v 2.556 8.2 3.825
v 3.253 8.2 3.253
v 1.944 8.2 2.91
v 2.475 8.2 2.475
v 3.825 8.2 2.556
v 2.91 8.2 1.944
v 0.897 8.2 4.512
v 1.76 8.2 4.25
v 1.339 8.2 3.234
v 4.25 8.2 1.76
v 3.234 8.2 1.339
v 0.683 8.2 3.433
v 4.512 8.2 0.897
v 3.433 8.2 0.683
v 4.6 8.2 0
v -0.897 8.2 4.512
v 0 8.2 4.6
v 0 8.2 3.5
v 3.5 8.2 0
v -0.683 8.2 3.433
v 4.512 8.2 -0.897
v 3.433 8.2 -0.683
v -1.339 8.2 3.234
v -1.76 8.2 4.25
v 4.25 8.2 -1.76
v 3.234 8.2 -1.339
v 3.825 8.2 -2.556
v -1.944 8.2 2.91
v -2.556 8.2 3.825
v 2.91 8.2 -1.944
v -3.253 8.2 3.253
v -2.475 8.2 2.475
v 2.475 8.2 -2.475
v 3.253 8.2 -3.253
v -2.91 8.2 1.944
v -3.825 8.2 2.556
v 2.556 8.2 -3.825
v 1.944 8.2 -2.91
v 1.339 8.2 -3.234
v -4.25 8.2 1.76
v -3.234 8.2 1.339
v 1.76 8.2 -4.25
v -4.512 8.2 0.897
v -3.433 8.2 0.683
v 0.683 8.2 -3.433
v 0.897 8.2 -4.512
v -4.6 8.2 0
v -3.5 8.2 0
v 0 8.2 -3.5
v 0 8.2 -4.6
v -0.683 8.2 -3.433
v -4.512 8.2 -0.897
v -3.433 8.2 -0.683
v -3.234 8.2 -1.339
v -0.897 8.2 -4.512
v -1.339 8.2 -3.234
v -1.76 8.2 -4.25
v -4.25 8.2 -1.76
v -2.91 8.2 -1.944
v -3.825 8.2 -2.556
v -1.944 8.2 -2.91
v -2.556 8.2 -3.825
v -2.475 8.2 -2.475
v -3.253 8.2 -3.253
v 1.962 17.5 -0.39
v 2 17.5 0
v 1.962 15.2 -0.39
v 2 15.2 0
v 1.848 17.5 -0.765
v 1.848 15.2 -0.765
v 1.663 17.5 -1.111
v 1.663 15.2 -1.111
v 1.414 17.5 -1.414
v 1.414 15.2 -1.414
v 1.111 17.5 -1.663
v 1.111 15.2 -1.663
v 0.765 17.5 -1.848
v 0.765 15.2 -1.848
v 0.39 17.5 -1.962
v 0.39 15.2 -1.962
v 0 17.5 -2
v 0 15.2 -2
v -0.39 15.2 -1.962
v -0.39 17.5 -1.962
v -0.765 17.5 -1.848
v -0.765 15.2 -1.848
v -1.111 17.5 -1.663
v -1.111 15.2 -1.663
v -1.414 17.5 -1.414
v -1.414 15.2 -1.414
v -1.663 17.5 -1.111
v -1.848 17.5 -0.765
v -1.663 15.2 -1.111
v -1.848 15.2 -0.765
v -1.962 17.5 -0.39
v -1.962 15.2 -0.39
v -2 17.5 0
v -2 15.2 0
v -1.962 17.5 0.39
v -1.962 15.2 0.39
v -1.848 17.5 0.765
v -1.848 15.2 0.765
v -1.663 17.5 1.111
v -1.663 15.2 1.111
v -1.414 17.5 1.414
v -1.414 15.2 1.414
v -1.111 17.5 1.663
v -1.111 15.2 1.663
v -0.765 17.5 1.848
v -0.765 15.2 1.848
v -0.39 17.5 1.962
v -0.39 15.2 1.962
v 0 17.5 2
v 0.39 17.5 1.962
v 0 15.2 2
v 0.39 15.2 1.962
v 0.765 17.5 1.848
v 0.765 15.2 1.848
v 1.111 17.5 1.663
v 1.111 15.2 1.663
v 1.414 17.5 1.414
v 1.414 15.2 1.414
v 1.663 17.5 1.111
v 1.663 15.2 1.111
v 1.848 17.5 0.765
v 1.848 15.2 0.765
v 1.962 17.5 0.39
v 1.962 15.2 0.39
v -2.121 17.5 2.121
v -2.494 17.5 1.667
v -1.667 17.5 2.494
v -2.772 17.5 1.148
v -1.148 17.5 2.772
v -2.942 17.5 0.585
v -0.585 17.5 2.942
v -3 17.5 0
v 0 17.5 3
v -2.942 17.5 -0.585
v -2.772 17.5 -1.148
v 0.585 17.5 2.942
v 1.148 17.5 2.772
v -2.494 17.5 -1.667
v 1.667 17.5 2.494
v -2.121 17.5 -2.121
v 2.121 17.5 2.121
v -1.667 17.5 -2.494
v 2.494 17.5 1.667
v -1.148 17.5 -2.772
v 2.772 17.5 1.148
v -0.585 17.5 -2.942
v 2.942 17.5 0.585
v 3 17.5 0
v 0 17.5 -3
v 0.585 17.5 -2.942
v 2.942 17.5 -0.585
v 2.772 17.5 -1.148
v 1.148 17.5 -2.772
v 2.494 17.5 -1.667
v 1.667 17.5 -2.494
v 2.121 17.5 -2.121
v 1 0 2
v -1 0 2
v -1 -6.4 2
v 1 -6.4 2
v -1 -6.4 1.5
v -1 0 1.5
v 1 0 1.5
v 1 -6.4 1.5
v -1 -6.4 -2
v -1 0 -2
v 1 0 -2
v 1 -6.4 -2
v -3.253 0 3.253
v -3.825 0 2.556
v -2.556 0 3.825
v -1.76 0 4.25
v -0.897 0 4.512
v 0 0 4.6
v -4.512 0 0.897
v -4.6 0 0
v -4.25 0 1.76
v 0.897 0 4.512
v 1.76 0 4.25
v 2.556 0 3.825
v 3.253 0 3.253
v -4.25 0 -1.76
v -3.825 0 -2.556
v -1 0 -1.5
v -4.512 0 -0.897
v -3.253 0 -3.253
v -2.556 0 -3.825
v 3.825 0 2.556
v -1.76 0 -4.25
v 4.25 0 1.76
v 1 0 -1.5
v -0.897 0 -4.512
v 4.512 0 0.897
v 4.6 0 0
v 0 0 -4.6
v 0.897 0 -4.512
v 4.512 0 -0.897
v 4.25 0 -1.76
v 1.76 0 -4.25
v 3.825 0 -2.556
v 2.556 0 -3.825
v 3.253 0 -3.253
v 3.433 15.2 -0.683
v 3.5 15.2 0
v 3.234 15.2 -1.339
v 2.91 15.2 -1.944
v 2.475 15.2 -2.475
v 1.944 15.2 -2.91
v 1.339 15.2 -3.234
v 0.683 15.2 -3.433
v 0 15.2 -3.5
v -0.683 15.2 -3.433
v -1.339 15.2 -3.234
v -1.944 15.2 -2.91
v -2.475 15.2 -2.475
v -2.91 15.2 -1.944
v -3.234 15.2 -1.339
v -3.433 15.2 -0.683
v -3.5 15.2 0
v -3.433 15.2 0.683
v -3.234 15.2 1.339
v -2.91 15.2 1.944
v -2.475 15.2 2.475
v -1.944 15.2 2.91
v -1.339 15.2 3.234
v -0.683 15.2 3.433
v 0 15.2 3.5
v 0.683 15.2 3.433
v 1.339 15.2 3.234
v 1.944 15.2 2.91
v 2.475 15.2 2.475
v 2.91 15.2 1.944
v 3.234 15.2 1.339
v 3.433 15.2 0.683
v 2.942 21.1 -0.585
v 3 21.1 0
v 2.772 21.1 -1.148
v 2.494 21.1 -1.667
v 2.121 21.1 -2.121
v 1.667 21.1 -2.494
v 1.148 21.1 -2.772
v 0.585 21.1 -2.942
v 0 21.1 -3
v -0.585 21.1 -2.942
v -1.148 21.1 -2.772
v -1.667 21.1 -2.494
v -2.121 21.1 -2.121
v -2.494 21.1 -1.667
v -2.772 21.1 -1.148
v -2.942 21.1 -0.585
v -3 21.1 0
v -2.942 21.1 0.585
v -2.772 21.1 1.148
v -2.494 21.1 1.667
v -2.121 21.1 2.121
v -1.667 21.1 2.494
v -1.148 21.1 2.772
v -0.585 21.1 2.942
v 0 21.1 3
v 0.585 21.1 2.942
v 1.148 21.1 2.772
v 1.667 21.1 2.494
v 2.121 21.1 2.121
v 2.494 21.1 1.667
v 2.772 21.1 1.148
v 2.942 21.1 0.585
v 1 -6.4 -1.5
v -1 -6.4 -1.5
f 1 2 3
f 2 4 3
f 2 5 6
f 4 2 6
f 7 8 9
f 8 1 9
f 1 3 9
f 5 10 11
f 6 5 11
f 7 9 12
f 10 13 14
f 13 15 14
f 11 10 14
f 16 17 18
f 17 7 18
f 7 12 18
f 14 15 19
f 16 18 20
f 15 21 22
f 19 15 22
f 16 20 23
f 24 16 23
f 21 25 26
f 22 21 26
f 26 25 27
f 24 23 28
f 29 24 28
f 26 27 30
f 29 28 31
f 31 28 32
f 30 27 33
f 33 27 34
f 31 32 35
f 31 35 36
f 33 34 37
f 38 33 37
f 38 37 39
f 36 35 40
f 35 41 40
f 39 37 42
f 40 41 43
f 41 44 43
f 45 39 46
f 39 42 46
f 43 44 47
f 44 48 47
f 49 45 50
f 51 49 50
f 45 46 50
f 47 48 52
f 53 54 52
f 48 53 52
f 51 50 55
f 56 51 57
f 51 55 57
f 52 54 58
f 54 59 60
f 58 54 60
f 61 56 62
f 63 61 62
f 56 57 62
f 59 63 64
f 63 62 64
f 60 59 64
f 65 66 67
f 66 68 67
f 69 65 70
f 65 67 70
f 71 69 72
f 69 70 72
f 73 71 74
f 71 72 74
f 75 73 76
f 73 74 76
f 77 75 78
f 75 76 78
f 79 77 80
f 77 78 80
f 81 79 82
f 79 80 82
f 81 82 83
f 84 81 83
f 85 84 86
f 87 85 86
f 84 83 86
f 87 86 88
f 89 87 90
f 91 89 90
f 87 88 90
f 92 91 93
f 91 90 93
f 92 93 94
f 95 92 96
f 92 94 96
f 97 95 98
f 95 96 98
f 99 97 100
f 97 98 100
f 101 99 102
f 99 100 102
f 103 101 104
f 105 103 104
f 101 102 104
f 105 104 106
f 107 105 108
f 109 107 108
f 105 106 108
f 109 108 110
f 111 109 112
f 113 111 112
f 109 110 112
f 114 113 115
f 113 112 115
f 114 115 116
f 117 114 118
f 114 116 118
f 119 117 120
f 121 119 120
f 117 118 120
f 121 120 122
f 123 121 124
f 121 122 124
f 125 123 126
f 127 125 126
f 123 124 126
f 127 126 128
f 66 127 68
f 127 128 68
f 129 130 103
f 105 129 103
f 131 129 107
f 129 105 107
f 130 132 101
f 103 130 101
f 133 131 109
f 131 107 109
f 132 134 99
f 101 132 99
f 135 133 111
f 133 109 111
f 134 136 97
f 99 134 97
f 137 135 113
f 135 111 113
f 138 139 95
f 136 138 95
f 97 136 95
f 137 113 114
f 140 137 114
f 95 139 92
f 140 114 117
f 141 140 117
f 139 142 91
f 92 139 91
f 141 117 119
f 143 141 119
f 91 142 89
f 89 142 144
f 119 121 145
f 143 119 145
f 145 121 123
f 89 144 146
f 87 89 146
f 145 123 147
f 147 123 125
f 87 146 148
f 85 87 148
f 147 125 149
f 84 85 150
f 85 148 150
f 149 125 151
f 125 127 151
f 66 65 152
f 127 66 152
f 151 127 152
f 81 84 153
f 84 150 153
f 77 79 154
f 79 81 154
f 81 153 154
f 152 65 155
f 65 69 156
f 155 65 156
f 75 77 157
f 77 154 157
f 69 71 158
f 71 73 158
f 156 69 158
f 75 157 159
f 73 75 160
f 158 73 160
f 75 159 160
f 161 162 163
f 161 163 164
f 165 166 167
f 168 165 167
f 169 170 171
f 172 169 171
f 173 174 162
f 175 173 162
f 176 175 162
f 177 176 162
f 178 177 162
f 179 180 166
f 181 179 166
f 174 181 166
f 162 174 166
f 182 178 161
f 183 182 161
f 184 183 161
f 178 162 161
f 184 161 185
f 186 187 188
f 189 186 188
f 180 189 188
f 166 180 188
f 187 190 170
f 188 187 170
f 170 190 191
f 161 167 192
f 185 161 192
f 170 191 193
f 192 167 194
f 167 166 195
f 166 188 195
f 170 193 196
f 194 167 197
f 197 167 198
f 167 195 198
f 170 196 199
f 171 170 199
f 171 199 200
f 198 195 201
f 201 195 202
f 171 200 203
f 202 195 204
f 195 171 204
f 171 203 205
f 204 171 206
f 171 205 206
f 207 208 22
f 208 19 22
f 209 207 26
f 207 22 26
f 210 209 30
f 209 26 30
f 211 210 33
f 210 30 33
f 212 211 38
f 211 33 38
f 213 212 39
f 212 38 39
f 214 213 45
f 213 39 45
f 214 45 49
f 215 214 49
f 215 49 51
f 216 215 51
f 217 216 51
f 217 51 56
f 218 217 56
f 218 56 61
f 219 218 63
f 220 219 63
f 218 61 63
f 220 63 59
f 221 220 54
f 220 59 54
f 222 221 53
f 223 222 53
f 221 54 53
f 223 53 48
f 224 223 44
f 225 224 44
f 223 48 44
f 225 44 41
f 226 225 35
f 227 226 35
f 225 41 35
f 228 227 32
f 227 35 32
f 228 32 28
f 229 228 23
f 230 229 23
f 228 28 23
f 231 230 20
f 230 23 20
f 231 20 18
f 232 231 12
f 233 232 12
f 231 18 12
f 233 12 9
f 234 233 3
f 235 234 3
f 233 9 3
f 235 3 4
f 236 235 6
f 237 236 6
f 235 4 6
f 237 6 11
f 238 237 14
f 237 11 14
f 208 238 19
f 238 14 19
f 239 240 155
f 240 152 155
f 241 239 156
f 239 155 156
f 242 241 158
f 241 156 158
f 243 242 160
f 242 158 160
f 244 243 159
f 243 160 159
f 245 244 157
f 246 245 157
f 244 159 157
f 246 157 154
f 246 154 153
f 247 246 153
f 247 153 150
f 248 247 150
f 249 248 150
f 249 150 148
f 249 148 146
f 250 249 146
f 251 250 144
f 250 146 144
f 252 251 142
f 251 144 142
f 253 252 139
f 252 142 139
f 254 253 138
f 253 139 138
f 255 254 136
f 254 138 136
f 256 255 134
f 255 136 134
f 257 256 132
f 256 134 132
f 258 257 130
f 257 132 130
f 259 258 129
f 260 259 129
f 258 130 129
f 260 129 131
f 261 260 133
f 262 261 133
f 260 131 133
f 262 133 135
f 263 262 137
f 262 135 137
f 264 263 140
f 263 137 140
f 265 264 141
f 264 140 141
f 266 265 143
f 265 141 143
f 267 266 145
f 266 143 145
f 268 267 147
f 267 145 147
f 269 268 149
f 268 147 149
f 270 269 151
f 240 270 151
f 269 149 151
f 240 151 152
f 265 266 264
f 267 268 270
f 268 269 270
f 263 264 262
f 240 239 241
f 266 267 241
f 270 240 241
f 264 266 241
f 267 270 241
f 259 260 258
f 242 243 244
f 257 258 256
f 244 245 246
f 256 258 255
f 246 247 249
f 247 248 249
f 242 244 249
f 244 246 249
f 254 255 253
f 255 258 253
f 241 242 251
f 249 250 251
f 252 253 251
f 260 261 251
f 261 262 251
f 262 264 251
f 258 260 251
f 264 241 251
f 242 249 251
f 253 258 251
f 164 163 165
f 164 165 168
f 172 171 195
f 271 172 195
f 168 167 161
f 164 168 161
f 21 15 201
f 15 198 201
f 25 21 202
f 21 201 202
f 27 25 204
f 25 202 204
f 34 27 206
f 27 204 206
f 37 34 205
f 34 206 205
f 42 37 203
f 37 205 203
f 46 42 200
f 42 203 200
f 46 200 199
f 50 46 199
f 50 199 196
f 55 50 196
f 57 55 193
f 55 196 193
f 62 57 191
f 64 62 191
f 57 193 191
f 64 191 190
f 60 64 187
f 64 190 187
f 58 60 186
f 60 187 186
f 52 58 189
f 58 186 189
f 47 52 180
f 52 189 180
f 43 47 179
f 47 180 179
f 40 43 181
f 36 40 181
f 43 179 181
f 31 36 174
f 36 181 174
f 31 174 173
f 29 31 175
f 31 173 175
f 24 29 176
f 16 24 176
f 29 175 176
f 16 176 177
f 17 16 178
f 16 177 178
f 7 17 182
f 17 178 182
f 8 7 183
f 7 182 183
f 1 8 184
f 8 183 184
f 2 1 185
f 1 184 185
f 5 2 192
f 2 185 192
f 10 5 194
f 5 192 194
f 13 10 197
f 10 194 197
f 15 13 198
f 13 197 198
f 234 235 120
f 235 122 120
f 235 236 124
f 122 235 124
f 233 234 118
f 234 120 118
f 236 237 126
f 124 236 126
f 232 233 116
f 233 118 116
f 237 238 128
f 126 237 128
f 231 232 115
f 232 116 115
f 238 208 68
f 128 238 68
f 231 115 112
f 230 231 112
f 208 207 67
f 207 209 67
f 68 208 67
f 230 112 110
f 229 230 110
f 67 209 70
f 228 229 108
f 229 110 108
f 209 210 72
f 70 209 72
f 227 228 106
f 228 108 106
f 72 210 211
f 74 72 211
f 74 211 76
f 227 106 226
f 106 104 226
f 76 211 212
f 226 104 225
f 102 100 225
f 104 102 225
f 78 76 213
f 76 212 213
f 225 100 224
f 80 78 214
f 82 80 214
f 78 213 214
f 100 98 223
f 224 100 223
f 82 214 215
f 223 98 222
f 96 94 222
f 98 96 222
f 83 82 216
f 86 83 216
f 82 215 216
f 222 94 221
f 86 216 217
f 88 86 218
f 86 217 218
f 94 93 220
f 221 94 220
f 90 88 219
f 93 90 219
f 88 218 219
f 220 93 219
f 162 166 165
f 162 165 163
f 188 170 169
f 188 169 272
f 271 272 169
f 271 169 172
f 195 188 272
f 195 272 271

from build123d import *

# Parameters (mm, degrees)
SKETCH_2_W        = 2
SKETCH_2_H        = 0.5
EXTRUDE_795_DEPTH = 6.4


with BuildPart() as part:
    # Эскиз1 → Revolve 542 (revolve)
    with BuildSketch(Plane.XY):
        Polygon((0, 0), (0, 21.1), (3, 21.1), (3, 17.5), (2, 17.5), (2, 15.2), (3.5, 15.2), (3.5, 8.2), (4.6, 8.2), (4.6, 0), align=None)
    revolve(axis=Axis((0, 0, 0), (0, 1, 0)))

    # Эскиз2 → Extrude 795 (add)
    with BuildSketch(Plane.XZ):
        with Locations((0, 1.75)):
            Rectangle(SKETCH_2_W, SKETCH_2_H)
        with Locations((0, -1.75)):
            Rectangle(SKETCH_2_W, SKETCH_2_H)
    extrude(amount=EXTRUDE_795_DEPTH)


solid = part.part
